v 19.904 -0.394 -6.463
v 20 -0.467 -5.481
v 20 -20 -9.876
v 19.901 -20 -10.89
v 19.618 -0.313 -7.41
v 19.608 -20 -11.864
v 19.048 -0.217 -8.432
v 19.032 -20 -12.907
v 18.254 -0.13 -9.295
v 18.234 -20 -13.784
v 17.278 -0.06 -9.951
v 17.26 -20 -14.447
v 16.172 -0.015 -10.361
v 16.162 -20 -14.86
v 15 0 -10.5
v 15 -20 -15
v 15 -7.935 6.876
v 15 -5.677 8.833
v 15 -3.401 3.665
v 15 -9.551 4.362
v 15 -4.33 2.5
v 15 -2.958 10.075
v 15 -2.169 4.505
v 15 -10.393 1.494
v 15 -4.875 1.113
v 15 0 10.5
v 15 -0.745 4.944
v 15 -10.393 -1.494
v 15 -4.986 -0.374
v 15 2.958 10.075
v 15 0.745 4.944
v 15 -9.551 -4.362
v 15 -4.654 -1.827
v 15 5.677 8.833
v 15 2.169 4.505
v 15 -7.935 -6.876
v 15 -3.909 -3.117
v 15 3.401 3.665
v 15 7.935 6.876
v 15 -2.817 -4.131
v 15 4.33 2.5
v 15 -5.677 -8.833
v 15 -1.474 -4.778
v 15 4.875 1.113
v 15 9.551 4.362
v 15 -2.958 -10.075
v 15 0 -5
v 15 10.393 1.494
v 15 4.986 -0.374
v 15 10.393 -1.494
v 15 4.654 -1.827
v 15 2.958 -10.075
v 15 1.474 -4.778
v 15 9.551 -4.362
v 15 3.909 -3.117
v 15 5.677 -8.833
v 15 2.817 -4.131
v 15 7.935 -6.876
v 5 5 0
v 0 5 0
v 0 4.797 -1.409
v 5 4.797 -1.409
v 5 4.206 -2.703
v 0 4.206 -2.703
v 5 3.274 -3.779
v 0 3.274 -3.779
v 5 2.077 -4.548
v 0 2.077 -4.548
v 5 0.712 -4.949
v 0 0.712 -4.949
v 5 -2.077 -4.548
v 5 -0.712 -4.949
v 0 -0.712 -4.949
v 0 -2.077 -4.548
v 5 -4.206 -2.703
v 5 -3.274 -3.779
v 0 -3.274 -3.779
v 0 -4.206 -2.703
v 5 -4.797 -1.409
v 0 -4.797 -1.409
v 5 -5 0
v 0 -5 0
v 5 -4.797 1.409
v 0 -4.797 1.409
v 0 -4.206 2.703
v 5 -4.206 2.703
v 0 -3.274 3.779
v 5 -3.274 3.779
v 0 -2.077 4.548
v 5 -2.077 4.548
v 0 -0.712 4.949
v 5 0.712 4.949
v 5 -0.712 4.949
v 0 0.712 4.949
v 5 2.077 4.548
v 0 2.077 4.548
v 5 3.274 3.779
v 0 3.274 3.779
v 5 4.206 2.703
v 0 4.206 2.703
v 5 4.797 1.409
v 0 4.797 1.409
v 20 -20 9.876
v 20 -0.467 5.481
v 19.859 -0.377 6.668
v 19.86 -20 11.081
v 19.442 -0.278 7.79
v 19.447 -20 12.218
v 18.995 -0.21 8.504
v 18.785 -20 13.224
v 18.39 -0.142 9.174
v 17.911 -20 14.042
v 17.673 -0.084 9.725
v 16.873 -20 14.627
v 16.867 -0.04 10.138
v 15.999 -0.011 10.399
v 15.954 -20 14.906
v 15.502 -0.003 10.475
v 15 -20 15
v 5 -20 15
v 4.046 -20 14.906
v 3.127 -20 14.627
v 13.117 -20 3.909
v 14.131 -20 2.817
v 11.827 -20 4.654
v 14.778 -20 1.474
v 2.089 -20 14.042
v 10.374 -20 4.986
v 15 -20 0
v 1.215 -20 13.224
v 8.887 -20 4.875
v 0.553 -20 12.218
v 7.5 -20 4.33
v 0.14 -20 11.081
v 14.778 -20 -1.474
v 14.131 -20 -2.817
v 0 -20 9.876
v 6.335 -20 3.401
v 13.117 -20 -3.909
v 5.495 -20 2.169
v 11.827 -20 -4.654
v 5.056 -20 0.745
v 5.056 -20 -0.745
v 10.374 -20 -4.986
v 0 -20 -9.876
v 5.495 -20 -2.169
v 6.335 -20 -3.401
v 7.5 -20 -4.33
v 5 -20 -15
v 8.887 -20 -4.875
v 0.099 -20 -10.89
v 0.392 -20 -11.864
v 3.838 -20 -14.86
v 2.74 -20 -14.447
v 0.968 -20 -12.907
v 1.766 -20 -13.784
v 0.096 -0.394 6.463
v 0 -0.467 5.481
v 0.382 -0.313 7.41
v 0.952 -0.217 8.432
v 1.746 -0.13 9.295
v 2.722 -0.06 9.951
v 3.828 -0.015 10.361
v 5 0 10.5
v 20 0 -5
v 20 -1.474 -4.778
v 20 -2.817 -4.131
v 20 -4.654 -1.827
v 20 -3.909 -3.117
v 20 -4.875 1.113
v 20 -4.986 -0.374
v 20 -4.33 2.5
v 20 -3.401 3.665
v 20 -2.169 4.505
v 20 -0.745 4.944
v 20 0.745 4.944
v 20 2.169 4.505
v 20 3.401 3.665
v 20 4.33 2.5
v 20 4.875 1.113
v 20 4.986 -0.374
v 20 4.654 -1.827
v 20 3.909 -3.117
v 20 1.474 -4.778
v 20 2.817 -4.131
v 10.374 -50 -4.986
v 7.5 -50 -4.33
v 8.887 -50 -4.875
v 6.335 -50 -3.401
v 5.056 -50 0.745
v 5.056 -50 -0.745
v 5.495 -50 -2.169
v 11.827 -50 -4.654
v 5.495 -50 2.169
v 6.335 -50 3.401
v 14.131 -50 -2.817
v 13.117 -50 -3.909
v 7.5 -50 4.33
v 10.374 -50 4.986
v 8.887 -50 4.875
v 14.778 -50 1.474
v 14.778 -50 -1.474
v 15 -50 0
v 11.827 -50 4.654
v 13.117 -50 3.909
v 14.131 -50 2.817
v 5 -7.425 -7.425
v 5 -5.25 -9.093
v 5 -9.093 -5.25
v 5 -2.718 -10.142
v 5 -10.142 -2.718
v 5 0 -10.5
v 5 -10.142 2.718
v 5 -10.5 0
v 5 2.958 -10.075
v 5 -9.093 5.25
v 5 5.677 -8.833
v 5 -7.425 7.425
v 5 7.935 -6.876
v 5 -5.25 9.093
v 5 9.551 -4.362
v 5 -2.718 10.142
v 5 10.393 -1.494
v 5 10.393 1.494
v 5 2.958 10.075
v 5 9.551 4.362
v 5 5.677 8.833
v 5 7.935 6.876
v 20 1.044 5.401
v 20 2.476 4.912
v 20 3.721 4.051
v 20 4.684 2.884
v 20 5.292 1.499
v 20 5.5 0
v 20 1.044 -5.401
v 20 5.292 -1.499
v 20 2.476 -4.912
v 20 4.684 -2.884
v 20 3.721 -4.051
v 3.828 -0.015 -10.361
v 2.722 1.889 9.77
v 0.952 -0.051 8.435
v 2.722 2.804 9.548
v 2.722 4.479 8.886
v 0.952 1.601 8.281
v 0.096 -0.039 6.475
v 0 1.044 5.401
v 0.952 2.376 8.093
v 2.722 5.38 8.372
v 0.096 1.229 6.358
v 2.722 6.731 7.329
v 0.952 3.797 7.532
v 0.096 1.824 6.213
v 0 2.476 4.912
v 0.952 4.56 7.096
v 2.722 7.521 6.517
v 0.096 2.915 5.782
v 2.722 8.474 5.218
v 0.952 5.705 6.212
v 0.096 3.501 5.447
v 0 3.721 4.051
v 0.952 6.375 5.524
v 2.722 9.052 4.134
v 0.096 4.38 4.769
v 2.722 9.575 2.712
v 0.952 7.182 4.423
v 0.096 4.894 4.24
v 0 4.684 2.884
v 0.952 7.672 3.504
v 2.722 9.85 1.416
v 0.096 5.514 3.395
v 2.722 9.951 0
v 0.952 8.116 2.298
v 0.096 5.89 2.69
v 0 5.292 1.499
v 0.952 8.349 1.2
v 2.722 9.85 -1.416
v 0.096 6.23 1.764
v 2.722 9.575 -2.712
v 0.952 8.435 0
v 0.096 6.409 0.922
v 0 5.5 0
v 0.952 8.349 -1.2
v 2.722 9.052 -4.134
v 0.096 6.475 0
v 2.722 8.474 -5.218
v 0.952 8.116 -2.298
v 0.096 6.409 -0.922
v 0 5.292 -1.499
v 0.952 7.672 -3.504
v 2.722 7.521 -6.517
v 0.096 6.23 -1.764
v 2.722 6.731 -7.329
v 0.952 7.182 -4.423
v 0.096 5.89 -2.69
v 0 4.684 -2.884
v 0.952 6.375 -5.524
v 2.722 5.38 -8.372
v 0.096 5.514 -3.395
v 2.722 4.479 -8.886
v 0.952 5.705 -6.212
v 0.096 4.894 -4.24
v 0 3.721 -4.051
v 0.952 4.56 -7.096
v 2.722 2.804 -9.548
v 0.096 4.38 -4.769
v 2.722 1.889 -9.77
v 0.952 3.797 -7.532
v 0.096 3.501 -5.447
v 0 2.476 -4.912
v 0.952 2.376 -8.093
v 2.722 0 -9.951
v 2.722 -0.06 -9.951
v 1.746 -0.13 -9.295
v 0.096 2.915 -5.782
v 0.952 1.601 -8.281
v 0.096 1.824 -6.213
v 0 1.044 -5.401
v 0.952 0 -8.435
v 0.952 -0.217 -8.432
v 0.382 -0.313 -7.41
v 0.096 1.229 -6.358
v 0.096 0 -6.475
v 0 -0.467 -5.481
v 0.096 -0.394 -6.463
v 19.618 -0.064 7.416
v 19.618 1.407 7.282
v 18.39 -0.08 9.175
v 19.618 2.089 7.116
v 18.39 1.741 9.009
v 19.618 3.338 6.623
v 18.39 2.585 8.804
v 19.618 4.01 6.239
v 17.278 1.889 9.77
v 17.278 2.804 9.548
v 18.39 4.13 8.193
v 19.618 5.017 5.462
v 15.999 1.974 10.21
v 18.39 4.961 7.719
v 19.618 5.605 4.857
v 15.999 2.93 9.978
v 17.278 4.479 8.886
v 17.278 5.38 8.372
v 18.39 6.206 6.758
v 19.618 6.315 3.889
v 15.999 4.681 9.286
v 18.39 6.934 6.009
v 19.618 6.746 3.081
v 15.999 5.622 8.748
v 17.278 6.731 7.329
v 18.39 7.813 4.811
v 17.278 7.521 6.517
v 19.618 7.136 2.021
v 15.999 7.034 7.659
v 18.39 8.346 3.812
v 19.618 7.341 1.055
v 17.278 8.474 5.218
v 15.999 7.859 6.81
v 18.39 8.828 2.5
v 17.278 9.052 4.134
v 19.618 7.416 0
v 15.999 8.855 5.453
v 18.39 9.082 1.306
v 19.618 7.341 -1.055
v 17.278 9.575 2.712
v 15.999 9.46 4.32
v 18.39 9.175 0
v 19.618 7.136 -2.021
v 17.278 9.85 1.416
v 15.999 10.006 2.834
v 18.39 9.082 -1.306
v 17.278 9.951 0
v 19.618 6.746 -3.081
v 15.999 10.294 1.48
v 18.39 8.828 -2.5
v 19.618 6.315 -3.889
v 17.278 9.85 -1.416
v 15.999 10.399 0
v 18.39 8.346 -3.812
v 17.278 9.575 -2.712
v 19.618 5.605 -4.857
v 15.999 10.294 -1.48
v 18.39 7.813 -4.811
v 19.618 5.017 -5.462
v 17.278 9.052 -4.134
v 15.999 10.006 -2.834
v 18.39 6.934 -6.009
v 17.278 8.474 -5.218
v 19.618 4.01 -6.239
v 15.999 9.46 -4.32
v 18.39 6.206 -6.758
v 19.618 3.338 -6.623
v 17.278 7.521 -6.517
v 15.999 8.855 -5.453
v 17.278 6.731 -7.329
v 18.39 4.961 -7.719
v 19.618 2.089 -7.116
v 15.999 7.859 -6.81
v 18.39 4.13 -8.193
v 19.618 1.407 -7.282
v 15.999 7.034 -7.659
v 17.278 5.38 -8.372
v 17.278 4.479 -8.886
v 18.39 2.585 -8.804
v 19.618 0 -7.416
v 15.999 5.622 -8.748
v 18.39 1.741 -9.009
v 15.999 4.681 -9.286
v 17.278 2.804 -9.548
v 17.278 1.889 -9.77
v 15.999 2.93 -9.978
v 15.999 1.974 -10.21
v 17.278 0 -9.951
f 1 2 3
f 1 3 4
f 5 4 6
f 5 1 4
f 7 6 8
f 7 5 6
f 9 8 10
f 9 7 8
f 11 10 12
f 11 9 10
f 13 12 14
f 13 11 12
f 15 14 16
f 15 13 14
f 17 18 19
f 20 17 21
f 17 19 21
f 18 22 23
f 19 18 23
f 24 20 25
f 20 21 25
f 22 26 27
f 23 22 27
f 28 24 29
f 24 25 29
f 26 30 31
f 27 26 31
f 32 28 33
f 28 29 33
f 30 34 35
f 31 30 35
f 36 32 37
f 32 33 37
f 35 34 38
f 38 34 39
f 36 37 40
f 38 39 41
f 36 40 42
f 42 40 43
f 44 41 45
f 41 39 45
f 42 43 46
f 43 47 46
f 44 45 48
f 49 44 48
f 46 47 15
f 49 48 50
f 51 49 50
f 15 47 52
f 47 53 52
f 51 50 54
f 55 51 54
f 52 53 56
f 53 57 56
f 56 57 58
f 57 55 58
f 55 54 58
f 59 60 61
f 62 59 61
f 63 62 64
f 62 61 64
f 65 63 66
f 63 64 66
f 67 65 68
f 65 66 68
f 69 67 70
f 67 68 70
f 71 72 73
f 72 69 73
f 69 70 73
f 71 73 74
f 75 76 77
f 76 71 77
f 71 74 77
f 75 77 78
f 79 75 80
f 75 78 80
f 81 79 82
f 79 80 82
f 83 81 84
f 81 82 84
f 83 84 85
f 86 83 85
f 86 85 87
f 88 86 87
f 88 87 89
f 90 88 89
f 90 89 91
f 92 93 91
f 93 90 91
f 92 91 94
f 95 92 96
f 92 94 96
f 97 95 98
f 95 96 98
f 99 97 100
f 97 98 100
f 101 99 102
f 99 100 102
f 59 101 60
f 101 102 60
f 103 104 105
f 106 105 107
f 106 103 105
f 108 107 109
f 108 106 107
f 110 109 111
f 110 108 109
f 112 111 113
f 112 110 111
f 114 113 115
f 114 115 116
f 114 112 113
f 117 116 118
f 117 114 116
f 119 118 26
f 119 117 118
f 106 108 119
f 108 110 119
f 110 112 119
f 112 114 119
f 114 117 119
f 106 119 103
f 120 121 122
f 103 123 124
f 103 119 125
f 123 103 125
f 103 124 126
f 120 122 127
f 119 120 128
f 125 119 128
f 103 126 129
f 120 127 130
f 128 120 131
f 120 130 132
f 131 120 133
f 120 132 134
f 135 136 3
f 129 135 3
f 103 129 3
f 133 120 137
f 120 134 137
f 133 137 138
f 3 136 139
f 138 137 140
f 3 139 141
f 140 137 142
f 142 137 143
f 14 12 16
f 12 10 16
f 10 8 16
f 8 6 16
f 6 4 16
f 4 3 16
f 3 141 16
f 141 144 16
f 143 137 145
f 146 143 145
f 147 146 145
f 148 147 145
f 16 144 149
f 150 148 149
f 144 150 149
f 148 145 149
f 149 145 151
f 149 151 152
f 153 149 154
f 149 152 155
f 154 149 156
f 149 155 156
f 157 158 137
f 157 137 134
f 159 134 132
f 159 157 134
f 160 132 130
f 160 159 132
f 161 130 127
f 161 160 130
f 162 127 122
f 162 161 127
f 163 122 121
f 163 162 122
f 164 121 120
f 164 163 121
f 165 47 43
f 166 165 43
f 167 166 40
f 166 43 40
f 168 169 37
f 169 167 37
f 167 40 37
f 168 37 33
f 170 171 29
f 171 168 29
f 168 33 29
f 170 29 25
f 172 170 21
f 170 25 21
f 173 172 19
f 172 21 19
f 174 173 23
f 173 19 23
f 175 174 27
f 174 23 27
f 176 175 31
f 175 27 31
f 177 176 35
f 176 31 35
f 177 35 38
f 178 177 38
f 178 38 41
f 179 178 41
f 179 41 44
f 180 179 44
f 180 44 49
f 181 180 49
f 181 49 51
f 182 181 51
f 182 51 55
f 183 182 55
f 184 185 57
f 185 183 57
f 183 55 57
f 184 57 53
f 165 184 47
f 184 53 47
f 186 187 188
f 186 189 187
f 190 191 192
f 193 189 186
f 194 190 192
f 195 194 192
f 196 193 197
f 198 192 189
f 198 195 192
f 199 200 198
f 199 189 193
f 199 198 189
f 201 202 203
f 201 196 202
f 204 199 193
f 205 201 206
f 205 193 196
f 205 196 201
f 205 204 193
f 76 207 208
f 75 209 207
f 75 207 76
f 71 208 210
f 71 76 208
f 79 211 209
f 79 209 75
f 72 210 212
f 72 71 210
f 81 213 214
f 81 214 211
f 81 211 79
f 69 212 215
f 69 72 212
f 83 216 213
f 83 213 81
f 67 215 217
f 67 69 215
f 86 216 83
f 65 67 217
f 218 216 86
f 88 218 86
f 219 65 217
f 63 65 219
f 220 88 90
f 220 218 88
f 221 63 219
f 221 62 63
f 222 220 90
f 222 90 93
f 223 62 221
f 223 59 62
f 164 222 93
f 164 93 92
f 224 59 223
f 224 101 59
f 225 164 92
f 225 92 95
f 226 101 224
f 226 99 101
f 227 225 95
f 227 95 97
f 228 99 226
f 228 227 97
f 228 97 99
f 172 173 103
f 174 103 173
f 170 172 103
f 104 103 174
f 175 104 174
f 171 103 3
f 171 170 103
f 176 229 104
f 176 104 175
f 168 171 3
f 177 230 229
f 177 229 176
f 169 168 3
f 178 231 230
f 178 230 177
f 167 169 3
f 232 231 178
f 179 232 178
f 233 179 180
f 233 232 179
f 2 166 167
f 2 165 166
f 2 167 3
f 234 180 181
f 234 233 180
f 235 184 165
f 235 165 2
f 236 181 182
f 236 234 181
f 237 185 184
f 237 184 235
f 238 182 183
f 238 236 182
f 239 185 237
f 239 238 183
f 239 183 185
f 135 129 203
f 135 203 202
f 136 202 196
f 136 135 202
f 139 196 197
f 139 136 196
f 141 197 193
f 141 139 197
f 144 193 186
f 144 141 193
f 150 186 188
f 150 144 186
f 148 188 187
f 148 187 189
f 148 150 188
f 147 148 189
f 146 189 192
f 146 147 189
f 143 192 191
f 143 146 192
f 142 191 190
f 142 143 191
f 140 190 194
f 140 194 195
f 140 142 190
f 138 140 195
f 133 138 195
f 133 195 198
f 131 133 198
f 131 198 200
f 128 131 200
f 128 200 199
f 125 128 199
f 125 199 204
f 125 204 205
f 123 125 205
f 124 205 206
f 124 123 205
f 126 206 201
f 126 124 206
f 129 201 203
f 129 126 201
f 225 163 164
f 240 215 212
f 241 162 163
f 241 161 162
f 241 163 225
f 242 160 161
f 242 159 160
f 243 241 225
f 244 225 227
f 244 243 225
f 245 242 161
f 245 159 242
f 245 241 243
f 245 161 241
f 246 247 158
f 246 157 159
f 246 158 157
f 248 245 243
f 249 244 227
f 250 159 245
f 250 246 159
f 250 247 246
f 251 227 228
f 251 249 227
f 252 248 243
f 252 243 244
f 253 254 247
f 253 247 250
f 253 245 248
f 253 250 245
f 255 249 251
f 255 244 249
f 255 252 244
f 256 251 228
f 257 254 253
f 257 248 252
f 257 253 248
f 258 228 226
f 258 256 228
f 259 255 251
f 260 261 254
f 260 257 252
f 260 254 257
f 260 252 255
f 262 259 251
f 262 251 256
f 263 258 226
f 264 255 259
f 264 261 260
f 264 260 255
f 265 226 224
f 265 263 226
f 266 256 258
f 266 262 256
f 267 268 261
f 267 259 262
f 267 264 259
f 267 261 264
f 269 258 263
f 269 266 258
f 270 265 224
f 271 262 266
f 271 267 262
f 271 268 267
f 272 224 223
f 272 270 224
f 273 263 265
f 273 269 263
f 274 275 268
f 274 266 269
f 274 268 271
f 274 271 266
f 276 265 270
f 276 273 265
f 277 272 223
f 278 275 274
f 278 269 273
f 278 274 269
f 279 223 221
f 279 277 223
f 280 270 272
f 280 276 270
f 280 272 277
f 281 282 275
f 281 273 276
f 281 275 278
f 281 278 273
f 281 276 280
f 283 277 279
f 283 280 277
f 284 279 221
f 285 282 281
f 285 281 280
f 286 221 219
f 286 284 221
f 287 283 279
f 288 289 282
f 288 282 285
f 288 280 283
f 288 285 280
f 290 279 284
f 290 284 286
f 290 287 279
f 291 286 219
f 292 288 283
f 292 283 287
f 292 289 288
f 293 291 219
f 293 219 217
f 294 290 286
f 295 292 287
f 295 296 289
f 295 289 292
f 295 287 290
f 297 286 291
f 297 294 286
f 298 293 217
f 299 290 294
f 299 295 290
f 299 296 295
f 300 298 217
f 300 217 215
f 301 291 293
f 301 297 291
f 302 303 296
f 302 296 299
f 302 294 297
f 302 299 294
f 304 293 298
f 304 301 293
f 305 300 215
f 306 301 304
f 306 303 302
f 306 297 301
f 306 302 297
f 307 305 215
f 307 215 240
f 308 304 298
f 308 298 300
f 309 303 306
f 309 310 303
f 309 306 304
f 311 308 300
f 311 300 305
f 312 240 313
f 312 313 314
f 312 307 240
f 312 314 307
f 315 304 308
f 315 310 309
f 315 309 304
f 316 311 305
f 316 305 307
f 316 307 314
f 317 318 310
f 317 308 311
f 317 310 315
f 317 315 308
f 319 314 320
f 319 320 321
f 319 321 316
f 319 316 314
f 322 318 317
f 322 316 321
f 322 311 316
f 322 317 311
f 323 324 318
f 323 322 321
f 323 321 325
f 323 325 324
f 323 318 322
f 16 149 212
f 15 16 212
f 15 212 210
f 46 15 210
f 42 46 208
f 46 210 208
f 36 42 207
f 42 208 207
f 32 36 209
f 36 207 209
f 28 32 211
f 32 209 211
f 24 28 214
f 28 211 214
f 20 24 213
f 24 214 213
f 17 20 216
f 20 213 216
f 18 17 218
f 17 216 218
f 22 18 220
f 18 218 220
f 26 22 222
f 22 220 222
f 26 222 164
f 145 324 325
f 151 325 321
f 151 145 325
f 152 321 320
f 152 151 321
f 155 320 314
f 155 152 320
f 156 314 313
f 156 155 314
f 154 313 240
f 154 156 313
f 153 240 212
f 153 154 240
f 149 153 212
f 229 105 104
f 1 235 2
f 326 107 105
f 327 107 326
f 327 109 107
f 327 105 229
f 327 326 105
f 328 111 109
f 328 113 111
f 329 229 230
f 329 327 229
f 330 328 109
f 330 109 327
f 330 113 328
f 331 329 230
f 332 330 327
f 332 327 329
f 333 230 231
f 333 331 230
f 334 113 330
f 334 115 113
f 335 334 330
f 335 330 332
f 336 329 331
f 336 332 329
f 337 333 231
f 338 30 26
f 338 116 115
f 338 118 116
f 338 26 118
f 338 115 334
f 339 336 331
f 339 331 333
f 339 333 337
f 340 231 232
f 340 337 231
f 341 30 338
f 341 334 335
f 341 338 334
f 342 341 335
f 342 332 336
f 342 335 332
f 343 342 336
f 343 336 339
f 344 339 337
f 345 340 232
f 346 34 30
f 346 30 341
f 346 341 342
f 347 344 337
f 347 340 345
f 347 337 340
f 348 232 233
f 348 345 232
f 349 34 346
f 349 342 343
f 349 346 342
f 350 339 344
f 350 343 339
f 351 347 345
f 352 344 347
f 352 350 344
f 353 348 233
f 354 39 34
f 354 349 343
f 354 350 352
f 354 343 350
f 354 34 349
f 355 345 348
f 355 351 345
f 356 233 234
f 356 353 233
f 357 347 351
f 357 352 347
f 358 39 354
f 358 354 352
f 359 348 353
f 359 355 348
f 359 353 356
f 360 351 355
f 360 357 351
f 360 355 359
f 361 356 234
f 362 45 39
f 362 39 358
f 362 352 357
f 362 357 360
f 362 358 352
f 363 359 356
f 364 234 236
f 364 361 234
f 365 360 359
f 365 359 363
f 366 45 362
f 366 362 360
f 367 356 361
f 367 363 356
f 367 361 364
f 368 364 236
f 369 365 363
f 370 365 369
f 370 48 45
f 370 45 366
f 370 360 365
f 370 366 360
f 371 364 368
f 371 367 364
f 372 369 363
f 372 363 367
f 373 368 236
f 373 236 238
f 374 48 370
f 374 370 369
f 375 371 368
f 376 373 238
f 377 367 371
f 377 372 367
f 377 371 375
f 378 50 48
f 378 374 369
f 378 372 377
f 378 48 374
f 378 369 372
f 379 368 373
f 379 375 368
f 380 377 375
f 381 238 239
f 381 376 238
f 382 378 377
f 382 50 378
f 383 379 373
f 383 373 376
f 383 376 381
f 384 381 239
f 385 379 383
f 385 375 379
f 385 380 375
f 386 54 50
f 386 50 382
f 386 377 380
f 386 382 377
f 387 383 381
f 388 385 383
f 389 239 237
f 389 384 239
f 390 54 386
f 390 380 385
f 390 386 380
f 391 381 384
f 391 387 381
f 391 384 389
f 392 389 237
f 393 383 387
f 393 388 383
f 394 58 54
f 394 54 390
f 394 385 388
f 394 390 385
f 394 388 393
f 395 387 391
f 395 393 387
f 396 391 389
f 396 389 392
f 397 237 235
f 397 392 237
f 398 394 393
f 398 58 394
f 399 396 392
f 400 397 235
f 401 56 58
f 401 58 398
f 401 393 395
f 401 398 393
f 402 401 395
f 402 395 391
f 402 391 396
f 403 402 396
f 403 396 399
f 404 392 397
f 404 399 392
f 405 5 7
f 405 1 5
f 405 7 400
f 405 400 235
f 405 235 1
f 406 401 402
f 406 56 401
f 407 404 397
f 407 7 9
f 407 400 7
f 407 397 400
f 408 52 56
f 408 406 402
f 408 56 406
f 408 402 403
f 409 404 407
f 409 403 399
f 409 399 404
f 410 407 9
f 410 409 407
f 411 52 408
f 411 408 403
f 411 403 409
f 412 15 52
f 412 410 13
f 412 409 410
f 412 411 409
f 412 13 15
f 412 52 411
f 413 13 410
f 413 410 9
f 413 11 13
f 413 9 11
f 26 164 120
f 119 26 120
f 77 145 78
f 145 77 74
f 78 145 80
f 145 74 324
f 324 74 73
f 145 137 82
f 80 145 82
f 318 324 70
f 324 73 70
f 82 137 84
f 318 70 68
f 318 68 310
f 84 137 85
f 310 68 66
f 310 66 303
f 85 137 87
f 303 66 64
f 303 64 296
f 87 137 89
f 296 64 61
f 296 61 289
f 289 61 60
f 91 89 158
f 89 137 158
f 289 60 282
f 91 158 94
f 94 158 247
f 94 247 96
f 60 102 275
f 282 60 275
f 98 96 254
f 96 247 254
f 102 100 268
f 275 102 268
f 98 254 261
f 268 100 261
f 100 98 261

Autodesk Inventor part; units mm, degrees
ref_plane "YZ Plane" through (0, 0, 0) normal (1, 0, 0) x (0, 1, 0)
ref_plane "XZ Plane" through (0, 0, 0) normal (0, 1, 0) x (-1, 0, 0)
ref_plane "XY Plane" through (0, 0, 0) normal (0, 0, 1) x (1, 0, 0)
sketch "Sketch1" plane through (0, 0, 0) normal (1, 0, 0) x (0, 1, 0)
  circle A0 centre (0, 0) radius 5
  circle A1 centre (0, 0) radius 10.5
  line L0 (0, 0) -> (-20, 0)
  line L1 (-20, 0) -> (-20, -15)
  line L2 (-20, -15) -> (-20, 15)
  line L3 (-20, 15) -> (0, 10.5)
  line L4 (0, -10.5) -> (-20, -15)
  dimension "d0" = 10
  dimension "d1" = 21
  dimension "d2" = 20
  dimension "d3" = 15
  dimension "d4" = 30
extrude "Extrusion1" add sketch "Sketch1" along normal blind 5
sketch "Sketch2" plane through (5, 0, 0) normal (1, 0, 0) x (0, 0, -1)
  arc A0 (10.5, 0) -> (-10.5, 0) centre (0, 0) ccw projected
  circle A1 centre (0, 0) radius 10.5
  line L0 (-10.5, 0) -> (-15, -20) projected
  line L1 (-10.5, 0) -> (-15, -20)
  line L2 (15, -20) -> (10.5, 0) projected
  line L3 (-15, -20) -> (15, -20)
  line L4 (15, -20) -> (10.5, 0)
  point P0 (-10.5, 0)
extrude "Extrusion2" add sketch "Sketch2" along normal blind 10 contours L2 L3 L0 A1
sketch "Sketch4" plane through (15, 0, 0) normal (1, 0, 0) x (0, 0, -1)
  circle A0 centre (0, 0) radius 5
  circle A1 centre (0, 0) radius 10.5
  line L0 (15, -20) -> (10.5, 0) projected
  line L1 (10.5, 0) -> (15, -20)
  line L2 (-15, -20) -> (15, -20) projected
  line L3 (15, -20) -> (-15, -20)
  line L4 (-10.5, 0) -> (-15, -20) projected
  line L5 (-15, -20) -> (-10.5, 0)
extrude "Extrusion3" add sketch "Sketch4" along normal blind 5
sketch "Sketch5" plane through (0, -20, -15) normal (0, -1, 0) x (1, 0, 0)
  line L0 (20, 4.5) -> (20, 25.5) projected
  line L1 (20, 15) -> (0, 15)
  circle A0 centre (10, 15) radius 5
  dimension "d11" = 10
extrude "Extrusion4" add sketch "Sketch5" along normal blind 30
fillet "Fillet1" radius 5 6 edges at (20, -10, 12.75) (20, -10, -12.75) (20, 10.5, 0) (0, 10.5, 0) (0, -10, -12.75) (0, -10, 12.75)
properties part number "wrist"
